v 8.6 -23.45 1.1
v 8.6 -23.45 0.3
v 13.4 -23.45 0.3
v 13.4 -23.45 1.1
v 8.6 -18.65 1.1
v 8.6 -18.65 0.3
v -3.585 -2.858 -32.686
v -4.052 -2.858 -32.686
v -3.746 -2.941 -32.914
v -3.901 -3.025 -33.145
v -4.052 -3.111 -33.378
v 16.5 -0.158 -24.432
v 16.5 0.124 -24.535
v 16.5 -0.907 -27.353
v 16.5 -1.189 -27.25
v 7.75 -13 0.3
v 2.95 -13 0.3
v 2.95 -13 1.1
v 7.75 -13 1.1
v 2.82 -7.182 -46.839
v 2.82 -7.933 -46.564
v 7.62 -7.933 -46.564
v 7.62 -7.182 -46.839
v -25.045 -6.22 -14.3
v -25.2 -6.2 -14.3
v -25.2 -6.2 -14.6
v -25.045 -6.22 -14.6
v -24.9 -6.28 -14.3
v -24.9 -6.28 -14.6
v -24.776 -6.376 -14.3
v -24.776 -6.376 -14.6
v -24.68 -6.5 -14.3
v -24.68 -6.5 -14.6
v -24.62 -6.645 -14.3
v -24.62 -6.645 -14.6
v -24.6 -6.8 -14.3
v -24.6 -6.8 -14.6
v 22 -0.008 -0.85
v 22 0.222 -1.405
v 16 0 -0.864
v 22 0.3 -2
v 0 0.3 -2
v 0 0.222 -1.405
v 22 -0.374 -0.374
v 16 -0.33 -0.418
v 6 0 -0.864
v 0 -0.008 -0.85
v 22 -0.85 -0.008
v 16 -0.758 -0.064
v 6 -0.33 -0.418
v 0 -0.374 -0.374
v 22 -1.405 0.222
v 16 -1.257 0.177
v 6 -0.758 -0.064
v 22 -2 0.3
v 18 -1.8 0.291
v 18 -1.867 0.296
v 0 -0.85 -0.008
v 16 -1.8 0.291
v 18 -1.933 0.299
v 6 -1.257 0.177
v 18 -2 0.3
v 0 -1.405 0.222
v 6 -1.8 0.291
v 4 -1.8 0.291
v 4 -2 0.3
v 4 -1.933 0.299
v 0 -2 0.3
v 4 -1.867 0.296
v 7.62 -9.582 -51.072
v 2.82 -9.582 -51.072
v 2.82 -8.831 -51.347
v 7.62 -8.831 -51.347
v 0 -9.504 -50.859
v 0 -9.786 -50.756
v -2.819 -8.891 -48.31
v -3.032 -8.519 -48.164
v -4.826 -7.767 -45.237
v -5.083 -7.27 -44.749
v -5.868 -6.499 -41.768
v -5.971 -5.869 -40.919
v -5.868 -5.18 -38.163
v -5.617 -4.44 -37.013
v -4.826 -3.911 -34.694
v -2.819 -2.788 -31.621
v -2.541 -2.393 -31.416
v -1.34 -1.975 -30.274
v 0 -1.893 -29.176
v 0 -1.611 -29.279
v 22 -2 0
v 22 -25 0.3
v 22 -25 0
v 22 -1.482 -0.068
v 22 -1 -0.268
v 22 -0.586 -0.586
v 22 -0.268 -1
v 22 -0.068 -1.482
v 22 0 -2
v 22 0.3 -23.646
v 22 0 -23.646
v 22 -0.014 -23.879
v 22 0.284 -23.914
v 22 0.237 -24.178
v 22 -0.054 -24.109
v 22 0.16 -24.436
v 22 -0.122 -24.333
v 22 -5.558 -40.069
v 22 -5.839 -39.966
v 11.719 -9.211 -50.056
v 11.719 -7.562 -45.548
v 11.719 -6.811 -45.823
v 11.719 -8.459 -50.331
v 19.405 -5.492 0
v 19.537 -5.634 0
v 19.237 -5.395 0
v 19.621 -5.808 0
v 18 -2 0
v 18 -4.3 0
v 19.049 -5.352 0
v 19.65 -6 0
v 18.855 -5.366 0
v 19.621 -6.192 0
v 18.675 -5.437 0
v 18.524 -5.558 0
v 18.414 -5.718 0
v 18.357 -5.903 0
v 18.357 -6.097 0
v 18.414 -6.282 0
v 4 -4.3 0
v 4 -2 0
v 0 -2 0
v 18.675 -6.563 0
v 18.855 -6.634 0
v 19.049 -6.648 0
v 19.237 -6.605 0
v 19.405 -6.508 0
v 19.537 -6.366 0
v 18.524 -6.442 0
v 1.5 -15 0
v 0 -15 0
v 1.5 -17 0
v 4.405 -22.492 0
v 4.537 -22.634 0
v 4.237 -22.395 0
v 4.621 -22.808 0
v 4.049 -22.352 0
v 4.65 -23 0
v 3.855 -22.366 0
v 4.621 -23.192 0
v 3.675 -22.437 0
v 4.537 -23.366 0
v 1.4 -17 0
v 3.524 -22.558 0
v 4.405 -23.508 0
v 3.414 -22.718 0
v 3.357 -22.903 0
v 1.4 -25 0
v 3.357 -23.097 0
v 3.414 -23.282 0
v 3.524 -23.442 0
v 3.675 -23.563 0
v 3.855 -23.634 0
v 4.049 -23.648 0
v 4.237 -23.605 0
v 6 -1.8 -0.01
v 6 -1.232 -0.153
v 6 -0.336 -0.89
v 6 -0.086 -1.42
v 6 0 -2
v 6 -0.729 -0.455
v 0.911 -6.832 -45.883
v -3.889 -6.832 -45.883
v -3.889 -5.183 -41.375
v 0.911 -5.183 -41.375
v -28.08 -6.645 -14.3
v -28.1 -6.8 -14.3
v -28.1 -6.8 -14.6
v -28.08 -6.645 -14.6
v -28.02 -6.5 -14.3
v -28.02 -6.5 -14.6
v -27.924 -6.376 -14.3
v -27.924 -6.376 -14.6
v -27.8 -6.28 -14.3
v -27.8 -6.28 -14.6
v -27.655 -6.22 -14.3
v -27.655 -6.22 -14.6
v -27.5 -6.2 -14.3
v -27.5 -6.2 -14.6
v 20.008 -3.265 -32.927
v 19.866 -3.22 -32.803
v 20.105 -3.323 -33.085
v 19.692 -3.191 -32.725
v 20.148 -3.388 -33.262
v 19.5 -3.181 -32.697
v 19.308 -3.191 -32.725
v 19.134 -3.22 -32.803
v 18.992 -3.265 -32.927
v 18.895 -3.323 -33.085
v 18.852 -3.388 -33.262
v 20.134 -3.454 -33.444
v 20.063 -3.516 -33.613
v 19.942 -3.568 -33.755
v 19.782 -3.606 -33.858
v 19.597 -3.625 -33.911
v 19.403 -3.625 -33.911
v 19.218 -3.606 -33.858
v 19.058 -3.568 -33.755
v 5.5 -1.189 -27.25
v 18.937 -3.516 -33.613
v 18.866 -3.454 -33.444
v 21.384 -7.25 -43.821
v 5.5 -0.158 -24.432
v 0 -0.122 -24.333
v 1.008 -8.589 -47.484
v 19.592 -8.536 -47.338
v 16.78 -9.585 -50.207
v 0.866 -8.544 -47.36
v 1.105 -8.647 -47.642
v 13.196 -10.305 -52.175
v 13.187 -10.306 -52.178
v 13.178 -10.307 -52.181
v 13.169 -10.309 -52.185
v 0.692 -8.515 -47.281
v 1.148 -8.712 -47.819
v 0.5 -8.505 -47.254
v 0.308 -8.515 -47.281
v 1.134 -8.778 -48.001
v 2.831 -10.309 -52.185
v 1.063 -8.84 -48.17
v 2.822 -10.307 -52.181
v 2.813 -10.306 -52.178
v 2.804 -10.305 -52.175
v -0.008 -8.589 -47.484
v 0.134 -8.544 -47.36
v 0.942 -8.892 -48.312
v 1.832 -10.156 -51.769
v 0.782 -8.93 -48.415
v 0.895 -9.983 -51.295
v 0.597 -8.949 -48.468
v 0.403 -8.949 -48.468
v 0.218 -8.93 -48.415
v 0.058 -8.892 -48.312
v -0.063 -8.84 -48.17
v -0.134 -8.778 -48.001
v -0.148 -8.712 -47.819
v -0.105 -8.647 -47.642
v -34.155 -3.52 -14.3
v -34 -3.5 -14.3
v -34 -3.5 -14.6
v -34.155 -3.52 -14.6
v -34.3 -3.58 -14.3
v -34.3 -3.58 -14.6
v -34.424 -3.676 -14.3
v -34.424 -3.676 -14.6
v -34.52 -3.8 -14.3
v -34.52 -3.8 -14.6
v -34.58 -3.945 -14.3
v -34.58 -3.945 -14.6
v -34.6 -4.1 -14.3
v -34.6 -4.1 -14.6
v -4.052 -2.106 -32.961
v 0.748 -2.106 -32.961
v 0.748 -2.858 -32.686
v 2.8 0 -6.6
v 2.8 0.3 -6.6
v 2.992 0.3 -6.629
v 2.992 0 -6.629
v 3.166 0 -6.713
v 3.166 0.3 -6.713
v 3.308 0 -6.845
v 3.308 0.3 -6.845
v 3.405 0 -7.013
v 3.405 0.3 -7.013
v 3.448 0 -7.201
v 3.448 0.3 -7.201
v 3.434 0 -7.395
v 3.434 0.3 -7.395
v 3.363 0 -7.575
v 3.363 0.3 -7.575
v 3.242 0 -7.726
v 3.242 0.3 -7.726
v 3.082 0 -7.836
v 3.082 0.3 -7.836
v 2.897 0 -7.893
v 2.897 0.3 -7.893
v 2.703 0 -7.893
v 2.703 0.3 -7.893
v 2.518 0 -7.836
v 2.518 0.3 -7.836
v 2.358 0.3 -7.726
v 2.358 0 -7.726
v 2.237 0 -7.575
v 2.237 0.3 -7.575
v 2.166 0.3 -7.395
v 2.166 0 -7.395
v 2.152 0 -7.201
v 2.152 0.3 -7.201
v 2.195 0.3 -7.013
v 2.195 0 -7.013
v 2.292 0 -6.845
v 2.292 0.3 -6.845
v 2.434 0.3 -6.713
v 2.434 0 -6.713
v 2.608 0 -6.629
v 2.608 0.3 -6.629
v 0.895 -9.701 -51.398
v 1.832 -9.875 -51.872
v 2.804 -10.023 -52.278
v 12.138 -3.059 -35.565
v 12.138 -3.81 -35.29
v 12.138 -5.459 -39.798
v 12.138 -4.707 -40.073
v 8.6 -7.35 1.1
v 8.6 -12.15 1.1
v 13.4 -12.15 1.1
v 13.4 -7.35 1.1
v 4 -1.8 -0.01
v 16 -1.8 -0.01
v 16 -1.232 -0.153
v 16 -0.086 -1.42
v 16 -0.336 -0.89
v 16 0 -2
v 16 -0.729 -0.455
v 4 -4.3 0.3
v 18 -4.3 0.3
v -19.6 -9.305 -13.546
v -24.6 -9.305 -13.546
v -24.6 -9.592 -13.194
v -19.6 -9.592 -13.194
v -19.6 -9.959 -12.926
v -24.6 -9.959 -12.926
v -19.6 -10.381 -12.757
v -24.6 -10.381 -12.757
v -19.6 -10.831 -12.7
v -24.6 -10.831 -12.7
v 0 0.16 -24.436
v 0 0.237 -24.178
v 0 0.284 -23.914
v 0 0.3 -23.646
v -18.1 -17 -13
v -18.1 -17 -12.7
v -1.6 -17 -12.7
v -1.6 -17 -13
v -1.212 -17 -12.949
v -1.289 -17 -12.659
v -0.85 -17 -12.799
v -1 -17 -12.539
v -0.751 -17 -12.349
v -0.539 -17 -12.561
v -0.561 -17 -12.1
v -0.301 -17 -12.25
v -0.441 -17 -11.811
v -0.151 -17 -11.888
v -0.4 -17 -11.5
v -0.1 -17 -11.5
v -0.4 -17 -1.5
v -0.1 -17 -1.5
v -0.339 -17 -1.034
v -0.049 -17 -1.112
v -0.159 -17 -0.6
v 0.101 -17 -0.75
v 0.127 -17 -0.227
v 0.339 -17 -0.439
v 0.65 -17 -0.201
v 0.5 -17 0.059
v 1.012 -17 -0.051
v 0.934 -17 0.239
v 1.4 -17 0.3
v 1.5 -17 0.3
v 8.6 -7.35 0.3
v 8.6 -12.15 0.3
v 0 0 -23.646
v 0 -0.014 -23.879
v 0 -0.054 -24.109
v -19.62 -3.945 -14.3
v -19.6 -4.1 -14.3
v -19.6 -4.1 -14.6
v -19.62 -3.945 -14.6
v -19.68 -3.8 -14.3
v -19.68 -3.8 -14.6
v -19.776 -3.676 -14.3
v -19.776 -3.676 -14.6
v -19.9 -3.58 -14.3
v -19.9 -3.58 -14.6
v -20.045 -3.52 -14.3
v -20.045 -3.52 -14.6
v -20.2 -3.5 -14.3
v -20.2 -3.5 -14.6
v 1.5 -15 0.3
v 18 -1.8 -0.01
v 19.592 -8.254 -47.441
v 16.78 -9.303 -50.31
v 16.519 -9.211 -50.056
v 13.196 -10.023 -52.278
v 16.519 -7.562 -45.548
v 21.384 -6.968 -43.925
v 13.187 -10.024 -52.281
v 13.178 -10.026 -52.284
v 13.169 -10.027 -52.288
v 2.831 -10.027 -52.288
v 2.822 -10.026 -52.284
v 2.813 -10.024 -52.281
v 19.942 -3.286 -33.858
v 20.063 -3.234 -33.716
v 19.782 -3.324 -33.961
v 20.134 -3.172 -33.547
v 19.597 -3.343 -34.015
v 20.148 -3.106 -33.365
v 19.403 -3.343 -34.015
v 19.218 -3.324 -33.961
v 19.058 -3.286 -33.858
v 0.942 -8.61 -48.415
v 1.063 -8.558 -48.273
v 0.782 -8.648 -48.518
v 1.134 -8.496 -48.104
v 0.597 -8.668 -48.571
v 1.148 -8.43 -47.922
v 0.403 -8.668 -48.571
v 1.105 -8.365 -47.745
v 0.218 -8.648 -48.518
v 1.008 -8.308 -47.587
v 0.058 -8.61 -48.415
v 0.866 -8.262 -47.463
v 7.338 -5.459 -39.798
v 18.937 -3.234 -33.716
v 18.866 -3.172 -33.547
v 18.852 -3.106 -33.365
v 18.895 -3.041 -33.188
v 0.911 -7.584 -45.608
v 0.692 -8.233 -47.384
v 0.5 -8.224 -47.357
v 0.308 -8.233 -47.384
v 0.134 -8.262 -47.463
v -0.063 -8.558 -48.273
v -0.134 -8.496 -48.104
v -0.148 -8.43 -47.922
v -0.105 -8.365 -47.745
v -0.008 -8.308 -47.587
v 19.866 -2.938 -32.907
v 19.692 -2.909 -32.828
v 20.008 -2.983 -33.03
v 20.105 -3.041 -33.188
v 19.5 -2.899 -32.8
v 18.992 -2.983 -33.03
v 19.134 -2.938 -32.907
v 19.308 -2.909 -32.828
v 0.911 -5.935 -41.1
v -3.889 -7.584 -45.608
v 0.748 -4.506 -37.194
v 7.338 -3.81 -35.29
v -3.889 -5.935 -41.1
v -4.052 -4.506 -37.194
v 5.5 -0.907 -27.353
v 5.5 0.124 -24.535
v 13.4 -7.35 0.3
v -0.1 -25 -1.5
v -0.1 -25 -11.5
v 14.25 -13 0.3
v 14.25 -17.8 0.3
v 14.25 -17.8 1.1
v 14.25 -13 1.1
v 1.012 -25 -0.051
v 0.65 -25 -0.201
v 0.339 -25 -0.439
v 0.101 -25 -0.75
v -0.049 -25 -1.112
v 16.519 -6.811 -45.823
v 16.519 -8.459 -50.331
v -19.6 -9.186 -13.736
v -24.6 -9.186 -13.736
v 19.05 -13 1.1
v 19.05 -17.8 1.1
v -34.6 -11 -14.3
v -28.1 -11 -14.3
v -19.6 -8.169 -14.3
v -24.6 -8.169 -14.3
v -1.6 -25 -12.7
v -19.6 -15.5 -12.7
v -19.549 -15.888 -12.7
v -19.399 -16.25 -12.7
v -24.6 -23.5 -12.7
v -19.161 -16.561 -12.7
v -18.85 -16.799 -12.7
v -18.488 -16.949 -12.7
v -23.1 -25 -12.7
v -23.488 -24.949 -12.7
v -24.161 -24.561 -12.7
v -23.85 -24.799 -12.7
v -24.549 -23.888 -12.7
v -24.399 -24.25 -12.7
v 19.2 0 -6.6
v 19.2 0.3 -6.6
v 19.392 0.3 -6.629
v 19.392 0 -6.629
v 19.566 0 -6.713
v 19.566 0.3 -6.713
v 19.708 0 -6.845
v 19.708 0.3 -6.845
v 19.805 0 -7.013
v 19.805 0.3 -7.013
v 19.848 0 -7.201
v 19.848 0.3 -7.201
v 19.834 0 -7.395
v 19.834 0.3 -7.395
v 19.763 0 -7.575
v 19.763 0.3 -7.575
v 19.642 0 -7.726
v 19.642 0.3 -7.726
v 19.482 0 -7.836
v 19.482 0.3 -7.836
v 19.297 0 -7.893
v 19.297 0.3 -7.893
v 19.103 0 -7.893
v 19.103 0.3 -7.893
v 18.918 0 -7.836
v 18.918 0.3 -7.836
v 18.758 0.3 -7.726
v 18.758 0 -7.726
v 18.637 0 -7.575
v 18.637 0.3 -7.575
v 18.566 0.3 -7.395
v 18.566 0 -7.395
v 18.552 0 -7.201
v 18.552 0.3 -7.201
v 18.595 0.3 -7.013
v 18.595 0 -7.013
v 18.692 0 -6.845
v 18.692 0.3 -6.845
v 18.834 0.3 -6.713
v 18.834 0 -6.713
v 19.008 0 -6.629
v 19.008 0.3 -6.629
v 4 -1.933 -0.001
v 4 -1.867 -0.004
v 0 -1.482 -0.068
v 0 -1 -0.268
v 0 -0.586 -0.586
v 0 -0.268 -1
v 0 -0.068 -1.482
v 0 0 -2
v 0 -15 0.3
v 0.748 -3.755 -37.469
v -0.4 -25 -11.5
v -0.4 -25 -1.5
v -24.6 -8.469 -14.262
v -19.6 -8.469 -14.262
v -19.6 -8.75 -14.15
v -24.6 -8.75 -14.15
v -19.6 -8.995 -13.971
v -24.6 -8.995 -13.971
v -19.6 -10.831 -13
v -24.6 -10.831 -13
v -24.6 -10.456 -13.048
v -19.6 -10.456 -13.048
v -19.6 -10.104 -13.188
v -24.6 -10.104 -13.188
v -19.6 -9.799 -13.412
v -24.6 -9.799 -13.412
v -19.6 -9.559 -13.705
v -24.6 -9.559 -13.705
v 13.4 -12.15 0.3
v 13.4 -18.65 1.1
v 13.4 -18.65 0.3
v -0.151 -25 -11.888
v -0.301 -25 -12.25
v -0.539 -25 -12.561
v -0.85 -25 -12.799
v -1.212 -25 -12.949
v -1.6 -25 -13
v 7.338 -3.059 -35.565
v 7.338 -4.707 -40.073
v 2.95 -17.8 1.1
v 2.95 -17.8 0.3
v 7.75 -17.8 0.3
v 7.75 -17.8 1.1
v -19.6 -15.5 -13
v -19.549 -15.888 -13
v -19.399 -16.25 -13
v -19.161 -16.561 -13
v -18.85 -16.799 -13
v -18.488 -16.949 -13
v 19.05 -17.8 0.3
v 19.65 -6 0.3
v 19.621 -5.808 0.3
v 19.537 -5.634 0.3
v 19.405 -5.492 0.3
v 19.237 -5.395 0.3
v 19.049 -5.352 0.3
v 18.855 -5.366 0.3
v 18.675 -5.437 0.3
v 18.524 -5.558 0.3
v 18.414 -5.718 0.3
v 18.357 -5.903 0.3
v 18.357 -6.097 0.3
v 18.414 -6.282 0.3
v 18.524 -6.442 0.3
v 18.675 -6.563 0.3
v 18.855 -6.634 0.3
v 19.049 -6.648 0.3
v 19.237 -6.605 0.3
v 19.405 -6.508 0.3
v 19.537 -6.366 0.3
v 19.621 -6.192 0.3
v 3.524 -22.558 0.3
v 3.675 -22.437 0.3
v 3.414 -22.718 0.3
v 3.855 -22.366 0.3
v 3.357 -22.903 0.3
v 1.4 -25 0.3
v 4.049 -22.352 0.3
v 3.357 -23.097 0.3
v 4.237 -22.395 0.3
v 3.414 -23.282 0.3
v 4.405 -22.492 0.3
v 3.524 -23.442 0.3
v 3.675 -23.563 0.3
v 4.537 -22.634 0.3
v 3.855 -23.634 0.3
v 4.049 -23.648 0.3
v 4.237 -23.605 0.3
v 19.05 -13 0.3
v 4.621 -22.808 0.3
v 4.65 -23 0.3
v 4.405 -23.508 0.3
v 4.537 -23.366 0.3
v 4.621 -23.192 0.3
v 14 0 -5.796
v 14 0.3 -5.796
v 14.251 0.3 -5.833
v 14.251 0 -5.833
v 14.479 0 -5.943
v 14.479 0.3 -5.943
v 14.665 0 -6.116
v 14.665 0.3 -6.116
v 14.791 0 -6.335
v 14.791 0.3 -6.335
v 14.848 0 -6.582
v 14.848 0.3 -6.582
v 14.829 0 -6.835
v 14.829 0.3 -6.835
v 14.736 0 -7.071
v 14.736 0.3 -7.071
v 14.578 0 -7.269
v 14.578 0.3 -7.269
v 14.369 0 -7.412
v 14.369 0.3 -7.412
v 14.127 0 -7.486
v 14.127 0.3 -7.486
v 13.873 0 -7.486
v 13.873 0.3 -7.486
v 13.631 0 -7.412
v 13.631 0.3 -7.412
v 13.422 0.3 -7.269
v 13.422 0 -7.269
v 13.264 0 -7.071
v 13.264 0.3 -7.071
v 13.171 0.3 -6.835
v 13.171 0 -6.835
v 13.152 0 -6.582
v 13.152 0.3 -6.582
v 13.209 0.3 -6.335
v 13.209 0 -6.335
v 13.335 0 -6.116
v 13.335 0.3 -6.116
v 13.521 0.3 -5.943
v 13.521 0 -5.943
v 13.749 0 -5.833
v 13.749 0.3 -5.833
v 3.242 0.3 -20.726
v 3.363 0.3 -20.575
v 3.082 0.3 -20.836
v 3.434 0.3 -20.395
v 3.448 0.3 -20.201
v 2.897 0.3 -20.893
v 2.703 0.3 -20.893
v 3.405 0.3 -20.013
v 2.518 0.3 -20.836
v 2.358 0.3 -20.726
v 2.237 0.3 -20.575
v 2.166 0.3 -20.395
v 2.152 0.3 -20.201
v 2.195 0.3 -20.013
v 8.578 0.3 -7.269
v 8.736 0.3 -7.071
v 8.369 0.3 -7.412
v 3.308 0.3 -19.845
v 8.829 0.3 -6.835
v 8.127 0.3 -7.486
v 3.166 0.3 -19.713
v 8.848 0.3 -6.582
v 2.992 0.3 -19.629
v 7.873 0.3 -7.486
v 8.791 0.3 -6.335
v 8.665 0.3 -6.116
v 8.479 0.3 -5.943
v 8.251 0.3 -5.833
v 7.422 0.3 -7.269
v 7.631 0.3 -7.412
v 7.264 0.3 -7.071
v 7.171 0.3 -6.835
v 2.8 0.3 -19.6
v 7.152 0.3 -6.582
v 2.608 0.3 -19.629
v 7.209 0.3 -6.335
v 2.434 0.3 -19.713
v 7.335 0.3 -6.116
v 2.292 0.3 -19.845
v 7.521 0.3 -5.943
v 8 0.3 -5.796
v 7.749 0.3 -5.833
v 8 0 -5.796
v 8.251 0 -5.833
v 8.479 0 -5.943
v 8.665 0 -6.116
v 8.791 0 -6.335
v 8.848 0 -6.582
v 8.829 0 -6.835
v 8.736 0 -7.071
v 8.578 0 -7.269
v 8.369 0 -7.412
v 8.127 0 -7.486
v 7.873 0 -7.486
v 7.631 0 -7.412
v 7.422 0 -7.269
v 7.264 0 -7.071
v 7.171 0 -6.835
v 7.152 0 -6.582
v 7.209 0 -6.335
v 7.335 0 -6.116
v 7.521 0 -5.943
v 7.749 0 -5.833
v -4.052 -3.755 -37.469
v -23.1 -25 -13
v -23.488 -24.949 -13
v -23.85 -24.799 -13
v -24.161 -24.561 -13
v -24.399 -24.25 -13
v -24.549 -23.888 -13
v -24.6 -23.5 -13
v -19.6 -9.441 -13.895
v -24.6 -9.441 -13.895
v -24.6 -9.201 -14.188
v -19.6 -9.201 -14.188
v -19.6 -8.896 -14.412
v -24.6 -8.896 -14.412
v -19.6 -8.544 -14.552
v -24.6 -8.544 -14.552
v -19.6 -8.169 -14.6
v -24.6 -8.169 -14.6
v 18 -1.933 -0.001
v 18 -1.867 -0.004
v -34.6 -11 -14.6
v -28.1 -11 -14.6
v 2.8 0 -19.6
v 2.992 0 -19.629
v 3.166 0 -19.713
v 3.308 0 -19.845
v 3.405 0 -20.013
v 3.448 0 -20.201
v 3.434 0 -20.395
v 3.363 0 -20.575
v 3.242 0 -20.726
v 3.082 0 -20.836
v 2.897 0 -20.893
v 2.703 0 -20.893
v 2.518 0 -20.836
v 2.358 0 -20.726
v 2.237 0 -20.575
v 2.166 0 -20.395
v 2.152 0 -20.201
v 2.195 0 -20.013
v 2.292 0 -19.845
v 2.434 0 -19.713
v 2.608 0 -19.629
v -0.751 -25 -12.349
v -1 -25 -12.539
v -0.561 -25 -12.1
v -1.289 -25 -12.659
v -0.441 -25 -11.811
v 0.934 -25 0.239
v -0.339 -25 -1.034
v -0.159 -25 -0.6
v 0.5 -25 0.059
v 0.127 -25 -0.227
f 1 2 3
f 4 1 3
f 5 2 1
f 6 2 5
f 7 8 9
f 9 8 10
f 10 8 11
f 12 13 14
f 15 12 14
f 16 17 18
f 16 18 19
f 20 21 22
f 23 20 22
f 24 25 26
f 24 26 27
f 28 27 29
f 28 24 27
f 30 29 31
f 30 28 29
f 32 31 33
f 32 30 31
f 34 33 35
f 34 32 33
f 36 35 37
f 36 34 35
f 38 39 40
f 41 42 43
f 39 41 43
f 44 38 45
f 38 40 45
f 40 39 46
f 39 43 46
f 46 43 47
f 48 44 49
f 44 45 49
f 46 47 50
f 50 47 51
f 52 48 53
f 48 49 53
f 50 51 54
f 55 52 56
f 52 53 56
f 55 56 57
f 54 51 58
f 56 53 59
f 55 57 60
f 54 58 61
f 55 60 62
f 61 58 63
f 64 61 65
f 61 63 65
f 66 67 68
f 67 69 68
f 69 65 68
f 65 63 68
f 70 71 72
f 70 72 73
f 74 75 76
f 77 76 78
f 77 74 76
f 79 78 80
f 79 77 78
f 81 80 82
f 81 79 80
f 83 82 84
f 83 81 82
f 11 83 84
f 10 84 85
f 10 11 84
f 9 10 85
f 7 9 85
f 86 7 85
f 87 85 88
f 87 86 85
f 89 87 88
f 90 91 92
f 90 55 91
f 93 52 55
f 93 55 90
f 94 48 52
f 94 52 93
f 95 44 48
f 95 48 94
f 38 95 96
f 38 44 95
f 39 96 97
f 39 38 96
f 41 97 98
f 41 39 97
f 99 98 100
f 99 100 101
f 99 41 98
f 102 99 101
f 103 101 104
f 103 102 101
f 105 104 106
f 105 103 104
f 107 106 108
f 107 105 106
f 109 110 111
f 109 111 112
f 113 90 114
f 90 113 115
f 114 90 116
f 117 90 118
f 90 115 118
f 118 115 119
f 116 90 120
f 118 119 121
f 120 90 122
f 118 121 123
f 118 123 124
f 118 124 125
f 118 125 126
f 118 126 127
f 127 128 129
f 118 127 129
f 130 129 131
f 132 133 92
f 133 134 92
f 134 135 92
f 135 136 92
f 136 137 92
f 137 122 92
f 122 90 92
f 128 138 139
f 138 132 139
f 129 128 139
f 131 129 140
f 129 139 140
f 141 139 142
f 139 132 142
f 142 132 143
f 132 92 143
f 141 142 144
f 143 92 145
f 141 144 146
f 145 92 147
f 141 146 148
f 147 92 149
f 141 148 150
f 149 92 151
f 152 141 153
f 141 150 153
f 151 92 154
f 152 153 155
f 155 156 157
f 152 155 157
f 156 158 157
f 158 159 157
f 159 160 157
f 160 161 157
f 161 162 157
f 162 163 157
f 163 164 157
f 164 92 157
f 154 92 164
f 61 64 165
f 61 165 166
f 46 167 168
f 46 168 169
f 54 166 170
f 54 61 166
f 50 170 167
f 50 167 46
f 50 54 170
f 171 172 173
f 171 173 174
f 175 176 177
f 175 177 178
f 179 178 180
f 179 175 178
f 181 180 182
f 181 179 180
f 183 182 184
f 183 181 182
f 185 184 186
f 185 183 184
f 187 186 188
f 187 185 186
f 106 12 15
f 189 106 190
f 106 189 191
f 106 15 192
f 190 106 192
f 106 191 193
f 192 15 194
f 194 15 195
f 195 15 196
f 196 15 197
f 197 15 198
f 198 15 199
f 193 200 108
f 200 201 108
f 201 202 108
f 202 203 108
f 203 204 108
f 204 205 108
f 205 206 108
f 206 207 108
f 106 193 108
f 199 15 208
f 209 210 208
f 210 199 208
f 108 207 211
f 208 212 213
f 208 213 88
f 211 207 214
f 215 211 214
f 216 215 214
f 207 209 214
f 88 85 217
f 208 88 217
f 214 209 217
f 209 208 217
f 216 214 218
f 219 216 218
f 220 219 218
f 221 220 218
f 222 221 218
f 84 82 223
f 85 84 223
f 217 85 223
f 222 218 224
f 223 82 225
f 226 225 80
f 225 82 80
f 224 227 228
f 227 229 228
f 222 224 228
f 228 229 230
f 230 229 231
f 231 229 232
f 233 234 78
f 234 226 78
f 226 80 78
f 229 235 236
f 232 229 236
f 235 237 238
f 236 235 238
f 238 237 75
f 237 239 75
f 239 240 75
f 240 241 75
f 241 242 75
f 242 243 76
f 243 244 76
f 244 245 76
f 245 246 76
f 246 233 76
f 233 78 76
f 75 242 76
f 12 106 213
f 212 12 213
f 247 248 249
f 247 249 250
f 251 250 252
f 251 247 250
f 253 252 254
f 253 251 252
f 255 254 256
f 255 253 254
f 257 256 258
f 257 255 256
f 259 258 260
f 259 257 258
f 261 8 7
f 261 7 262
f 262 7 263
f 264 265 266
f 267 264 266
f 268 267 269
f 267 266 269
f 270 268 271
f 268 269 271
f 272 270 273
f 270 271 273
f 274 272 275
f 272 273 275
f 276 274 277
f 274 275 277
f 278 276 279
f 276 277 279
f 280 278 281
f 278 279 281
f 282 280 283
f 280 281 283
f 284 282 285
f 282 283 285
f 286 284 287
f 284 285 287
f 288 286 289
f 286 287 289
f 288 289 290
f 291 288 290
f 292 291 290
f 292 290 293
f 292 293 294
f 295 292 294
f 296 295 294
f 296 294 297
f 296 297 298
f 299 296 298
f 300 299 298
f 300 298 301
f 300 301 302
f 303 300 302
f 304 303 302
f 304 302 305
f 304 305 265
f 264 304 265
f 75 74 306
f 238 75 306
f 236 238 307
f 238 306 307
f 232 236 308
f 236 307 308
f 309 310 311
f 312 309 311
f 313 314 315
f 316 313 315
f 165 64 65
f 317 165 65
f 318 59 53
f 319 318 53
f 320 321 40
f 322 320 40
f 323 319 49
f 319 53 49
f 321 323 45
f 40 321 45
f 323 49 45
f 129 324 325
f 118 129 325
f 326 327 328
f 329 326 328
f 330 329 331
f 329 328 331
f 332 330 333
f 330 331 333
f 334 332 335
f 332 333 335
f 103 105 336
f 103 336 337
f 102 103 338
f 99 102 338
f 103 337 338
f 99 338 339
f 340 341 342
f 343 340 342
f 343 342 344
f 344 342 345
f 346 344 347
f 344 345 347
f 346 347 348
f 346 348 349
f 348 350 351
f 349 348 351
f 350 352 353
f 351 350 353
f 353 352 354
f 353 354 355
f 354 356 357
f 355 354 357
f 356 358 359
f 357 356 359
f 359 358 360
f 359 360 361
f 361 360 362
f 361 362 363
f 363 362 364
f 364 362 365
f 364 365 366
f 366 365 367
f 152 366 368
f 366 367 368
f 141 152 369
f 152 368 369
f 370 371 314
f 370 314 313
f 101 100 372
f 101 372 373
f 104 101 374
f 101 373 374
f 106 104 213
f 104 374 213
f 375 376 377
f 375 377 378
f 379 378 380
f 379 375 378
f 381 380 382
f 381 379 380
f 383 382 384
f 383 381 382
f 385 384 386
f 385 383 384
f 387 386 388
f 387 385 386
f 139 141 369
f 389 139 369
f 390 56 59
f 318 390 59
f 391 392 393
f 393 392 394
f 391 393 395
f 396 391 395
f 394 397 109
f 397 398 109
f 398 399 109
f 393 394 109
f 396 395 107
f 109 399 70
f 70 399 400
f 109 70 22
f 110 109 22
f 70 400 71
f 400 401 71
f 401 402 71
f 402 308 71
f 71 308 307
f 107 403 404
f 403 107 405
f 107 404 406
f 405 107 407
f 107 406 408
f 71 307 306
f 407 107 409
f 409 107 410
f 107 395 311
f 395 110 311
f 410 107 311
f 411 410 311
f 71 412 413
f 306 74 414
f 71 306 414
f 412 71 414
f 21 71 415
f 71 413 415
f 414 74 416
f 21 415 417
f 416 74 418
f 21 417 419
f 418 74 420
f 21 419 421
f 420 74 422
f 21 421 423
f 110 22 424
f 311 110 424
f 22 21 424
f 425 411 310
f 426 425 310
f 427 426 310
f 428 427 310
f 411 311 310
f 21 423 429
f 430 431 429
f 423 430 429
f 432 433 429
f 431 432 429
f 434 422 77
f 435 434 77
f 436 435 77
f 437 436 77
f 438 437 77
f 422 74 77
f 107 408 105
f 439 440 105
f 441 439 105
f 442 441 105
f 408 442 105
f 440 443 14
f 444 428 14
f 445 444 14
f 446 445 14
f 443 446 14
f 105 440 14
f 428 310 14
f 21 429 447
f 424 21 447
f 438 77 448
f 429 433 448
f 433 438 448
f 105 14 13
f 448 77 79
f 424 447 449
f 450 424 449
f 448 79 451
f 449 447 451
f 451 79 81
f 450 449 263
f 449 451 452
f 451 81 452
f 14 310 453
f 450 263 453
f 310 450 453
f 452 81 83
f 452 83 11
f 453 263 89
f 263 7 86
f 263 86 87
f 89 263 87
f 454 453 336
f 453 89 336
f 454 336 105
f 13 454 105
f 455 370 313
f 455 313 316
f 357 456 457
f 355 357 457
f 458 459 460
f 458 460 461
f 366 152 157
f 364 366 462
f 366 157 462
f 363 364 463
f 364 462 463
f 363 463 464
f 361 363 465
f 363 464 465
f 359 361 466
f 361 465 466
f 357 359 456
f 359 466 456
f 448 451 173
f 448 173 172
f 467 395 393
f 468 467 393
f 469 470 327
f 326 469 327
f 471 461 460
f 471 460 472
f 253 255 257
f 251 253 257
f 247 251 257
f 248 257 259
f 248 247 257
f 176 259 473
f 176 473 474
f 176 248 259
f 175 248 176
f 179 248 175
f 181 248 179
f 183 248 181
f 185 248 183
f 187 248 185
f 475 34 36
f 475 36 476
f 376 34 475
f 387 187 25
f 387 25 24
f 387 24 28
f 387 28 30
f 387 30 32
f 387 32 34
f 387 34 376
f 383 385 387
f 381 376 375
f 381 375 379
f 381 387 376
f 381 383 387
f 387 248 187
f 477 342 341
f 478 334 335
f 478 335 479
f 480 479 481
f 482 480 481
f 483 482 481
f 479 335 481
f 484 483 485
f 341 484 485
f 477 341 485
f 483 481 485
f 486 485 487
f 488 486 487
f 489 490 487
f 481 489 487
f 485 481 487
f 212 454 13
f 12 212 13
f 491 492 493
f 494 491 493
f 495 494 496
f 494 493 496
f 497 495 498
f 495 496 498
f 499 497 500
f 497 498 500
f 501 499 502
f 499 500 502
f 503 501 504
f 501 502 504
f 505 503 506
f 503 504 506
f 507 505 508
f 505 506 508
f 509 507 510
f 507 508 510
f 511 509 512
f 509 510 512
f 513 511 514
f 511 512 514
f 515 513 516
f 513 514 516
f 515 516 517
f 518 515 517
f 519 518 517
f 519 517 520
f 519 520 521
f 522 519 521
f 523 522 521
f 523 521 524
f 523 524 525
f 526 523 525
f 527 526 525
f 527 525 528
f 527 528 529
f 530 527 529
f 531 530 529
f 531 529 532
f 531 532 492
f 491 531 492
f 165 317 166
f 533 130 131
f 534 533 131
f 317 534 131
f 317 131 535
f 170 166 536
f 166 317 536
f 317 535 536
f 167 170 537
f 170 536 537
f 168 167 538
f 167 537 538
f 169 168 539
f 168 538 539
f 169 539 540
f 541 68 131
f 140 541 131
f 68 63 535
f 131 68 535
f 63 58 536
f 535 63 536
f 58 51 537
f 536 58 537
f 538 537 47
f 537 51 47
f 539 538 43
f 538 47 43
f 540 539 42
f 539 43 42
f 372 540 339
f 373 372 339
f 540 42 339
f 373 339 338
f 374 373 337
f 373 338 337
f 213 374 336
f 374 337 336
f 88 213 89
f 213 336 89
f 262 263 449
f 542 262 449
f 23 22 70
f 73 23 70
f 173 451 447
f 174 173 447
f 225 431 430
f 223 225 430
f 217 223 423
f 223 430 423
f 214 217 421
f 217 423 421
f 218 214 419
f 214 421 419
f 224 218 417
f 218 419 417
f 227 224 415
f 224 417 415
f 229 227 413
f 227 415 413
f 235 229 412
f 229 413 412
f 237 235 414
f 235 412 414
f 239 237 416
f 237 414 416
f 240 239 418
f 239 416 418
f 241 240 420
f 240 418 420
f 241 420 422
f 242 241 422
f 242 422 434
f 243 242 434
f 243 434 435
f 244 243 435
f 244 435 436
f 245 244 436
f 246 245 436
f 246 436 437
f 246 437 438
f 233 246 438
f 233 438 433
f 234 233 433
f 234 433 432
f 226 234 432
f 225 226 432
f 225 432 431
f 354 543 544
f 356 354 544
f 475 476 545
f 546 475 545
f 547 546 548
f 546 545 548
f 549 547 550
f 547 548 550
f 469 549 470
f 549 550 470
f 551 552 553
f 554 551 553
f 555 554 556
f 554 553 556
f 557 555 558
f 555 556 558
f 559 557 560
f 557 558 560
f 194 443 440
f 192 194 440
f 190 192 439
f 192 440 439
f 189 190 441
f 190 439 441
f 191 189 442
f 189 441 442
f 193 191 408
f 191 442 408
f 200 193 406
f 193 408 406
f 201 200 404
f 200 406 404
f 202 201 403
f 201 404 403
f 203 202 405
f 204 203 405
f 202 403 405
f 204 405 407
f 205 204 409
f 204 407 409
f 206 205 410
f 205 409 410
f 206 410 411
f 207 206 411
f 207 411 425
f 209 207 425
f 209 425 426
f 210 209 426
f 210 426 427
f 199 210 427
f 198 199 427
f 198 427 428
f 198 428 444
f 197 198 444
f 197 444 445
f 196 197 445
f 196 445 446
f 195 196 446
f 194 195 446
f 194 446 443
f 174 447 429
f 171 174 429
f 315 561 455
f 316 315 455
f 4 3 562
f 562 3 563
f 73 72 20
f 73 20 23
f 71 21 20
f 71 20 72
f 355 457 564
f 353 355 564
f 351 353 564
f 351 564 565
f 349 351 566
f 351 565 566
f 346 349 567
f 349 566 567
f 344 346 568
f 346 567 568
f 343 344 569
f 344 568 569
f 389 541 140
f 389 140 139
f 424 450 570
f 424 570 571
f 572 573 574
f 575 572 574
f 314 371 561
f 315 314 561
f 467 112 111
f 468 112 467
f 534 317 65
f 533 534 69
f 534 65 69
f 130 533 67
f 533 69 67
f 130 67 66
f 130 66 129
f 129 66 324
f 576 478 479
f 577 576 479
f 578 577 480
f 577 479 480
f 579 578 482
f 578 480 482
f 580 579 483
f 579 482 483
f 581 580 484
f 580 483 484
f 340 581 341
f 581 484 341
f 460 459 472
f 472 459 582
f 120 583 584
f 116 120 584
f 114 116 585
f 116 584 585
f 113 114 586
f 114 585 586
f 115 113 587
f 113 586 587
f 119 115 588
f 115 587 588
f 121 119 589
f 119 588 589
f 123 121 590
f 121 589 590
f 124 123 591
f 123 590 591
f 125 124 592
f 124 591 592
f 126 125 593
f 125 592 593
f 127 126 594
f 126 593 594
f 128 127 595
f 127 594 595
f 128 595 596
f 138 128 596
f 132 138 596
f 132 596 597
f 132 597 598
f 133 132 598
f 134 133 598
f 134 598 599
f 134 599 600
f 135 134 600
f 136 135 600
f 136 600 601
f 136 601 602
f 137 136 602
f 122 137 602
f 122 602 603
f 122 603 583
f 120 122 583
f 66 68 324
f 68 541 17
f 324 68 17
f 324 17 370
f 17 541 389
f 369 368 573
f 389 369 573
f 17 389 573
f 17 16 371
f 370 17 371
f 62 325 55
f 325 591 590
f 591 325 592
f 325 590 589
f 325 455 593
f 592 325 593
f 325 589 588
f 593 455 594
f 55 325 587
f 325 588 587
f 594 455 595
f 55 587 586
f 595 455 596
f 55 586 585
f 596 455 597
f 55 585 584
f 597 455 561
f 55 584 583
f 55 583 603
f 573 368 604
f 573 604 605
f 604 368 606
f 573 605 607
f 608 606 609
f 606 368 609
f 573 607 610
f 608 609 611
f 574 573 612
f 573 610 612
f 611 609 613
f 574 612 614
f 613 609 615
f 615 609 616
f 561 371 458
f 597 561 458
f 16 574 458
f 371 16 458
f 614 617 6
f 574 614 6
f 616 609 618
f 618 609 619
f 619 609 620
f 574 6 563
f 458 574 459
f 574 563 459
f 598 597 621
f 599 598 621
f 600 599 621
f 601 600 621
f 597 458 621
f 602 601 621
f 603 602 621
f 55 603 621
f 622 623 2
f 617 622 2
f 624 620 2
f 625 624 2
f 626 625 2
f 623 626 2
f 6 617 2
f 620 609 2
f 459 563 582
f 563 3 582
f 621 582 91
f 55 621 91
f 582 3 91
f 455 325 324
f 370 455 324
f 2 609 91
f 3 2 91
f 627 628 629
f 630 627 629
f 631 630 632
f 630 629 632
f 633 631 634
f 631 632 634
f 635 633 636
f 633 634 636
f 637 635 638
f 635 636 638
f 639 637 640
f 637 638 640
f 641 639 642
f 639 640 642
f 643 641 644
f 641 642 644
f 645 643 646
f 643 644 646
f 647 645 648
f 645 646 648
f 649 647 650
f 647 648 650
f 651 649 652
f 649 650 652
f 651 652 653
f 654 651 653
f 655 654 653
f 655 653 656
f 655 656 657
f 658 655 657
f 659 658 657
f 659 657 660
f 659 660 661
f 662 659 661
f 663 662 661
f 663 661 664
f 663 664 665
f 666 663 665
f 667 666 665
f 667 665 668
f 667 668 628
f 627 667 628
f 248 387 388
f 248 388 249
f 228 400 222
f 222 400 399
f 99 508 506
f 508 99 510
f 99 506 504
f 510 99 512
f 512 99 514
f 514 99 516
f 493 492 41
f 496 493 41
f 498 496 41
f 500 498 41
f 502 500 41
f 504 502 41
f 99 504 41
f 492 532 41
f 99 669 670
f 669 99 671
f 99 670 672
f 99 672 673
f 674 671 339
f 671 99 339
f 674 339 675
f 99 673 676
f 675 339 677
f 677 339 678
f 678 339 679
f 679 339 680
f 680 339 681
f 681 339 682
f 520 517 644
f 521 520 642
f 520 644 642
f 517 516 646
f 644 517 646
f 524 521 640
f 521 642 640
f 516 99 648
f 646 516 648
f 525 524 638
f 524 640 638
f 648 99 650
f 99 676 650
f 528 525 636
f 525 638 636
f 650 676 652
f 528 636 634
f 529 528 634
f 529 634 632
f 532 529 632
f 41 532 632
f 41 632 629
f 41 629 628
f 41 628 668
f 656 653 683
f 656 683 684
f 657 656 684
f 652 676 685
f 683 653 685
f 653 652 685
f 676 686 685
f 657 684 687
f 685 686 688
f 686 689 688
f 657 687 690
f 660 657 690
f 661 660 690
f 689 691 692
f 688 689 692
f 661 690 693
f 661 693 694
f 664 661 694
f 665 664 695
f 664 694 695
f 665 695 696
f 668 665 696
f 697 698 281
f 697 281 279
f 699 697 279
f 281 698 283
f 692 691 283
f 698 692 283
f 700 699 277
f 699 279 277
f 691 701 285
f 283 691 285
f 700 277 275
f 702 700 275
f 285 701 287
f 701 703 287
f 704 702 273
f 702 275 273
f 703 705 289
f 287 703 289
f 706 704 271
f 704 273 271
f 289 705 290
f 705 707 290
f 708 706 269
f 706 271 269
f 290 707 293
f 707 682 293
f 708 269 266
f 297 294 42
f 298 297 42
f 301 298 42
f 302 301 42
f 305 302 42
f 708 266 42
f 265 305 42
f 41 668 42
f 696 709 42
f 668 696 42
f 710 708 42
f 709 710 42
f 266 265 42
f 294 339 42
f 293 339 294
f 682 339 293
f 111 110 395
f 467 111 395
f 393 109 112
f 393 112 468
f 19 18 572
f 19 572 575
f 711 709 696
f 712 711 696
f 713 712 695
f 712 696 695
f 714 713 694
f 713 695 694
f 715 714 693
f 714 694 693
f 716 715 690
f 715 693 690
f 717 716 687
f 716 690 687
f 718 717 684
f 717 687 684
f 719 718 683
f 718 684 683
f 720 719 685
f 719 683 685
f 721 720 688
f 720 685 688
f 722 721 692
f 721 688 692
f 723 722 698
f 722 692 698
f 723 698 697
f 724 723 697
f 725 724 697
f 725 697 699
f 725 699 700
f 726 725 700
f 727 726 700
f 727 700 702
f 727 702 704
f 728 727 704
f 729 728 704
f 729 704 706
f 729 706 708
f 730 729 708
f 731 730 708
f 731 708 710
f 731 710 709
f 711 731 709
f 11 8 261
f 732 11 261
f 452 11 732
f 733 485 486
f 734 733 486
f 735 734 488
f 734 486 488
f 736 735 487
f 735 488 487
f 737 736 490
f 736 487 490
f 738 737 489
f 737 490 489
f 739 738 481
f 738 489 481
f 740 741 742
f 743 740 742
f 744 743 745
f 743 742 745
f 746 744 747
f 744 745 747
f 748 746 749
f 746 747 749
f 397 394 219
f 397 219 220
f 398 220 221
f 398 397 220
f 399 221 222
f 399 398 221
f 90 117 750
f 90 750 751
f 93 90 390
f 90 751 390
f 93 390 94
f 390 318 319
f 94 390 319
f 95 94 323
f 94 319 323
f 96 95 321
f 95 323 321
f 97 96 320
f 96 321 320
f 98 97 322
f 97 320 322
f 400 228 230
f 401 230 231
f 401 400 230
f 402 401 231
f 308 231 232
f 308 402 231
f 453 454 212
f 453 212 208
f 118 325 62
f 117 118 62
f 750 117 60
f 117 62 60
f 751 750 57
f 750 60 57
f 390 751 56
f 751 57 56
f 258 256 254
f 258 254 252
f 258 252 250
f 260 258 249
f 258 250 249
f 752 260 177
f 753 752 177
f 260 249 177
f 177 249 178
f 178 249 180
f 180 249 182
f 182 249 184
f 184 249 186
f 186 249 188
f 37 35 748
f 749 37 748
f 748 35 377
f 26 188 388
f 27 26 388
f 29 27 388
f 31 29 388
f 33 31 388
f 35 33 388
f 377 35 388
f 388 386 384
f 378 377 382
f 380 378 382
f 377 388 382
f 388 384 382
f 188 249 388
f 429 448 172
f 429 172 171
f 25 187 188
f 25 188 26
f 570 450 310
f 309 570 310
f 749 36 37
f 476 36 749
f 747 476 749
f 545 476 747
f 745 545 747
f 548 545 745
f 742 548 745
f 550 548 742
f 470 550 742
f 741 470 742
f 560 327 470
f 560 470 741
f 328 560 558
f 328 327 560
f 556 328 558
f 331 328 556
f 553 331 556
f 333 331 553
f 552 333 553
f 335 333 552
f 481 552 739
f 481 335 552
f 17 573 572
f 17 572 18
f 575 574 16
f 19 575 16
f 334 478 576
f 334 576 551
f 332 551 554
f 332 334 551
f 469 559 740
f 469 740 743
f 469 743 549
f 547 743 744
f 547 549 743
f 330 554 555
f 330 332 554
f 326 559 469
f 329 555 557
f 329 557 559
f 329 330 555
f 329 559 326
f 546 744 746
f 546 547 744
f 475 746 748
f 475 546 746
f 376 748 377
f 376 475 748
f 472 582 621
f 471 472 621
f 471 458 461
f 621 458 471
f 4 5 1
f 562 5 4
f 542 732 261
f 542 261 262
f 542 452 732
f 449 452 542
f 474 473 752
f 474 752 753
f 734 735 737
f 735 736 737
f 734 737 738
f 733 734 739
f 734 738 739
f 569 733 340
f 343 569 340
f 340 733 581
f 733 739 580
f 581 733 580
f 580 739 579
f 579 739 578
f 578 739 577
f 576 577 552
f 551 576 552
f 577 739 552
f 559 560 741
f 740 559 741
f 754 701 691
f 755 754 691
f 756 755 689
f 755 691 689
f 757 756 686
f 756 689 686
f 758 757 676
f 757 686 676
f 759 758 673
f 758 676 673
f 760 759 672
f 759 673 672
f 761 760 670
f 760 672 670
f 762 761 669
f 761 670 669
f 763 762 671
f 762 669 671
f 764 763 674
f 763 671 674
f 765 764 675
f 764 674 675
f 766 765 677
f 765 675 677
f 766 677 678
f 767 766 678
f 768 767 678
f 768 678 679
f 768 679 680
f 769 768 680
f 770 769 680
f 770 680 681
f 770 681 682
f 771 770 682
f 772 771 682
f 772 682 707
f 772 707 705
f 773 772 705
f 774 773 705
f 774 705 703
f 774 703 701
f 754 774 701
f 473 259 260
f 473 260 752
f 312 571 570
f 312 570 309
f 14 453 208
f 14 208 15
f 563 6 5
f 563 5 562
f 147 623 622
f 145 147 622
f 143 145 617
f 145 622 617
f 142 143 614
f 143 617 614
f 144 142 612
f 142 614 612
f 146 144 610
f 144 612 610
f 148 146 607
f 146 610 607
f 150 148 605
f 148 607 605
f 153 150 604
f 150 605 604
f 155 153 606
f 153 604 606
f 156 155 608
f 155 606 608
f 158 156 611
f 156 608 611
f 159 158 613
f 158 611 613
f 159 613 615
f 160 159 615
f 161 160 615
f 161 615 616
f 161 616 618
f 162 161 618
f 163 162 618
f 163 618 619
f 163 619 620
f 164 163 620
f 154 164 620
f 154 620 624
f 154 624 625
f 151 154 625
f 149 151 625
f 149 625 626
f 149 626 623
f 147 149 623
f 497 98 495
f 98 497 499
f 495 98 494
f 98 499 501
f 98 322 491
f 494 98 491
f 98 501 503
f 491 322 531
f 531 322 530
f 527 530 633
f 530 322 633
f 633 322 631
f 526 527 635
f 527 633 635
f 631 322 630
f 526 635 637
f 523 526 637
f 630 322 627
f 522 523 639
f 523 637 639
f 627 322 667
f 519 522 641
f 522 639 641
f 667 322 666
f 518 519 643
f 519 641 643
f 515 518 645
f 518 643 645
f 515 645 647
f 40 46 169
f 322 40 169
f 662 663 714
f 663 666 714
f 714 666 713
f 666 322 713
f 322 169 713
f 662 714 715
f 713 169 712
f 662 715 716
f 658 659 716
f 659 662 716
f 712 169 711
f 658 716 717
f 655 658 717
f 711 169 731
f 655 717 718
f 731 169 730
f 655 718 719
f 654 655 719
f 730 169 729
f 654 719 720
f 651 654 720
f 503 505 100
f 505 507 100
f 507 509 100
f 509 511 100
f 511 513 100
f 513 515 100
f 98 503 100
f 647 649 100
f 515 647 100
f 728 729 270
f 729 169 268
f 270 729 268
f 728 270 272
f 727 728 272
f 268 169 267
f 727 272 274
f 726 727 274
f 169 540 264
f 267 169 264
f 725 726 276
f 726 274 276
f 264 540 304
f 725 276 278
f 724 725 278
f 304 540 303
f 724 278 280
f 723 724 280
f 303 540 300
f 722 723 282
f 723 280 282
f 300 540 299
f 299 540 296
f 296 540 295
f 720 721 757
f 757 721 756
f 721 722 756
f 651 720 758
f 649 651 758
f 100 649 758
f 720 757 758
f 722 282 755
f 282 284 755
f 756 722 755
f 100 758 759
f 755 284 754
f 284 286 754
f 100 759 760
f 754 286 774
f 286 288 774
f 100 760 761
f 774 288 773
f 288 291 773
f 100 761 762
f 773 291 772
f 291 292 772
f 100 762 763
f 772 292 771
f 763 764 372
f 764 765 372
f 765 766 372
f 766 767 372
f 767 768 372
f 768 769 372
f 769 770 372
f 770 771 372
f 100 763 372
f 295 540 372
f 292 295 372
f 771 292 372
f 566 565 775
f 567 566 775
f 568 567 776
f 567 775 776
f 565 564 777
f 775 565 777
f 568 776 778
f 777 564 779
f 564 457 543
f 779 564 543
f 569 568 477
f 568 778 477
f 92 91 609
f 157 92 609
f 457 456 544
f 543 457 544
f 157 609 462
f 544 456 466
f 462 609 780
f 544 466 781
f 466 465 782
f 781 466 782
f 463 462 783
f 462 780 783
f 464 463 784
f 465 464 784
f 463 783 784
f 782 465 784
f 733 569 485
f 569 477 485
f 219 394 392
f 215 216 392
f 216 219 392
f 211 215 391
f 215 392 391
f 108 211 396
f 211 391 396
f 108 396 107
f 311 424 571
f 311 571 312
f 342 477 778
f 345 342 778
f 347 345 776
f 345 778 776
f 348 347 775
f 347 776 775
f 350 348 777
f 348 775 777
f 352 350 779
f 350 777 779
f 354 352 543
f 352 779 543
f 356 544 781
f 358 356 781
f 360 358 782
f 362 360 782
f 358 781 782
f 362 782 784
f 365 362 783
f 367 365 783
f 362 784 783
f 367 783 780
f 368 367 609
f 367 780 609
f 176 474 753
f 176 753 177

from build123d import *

# Parameters (mm, degrees)
EXTRUDE_1_DEPTH     = 22
CUT_EXTRUDE_1_DEPTH = 4
CUT_EXTRUDE_2_DEPTH = 64.319089808
SKETCH_3_3_R        = 14
EXTRUDE_2_DEPTH     = 0.3
SKETCH_4_W          = 4.8
SKETCH_4_H          = 4.8
EXTRUDE_3_DEPTH     = 0.8
SKETCH_5_R          = 0.85
CUT_EXTRUDE_3_DEPTH = 63.897702188
SKETCH_6_W          = 11
SKETCH_6_H          = 3
CUT_EXTRUDE_4_DEPTH = 1
SKETCH_7_W          = 4.8
SKETCH_7_H          = 4.8
EXTRUDE_4_DEPTH     = 0.8
SKETCH_9_W          = 1.5
SKETCH_9_H          = 0.3
CUT_EXTRUDE_5_DEPTH = 10
EXTRUDE_5_DEPTH     = 8
EXTRUDE_6_DEPTH     = 0.3
EXTRUDE_7_DEPTH     = 5
EXTRUDE_8_DEPTH     = 0.3
SKETCH_14_R         = 0.65
SKETCH_14_W         = 12
SKETCH_14_H         = 2
CUT_EXTRUDE_6_DEPTH = 4
SKETCH_15_R         = 0.65
CUT_EXTRUDE_7_DEPTH = 4
SKETCH_16_R         = 0.65
CUT_EXTRUDE_8_DEPTH = 4


with BuildPart() as part:
    # 草图1 → 凸台-拉伸1 (new body)
    with BuildSketch(Plane(origin=(0, 0, 0), x_dir=(0, 0, -1), z_dir=(1, 0, 0))):
        with BuildLine():
            Line((0, -25), (0, -2))
            ThreePointArc((0, -2), (0.585786438, -0.585786438), (2, 0))
            Line((2, 0), (23.64572618, 0))
            ThreePointArc((23.64572618, 0), (23.99456936, -0.030657867), (24.332717753, -0.121691565))
            Line((24.332717753, -0.121691565), (52.174626532, -10.304873595))
            Line((52.174626532, -10.304873595), (52.277675268, -10.023127329))
            Line((52.277675268, -10.023127329), (24.435766489, 0.160054701))
            ThreePointArc((24.435766489, 0.160054701), (24.046895837, 0.264743453), (23.64572618, 0.3))
            Line((23.64572618, 0.3), (2, 0.3))
            ThreePointArc((2, 0.3), (0.373654403, -0.373654403), (-0.3, -2))
            Line((-0.3, -2), (-0.3, -25))
            Line((-0.3, -25), (0, -25))
        make_face()
    extrude(amount=EXTRUDE_1_DEPTH)

    # 草图2 → 切除-拉伸1 (cut)
    with BuildSketch(Plane.XY.offset(0.3)):
        Polygon((4, -4.3), (18, -4.3), (18, -1.8), (16, -1.8), (16, 0), (6, 0), (6, -1.8), (4, -1.8), align=None)
    extrude(amount=-CUT_EXTRUDE_1_DEPTH, mode=Mode.SUBTRACT)

    # 草图3 → 切除-拉伸2 (cut, through all)
    with BuildSketch(Plane(origin=(0, 8.024038665, -2.934793264), x_dir=(1, 0, 0), z_dir=(0, 0.9391542177229502, -0.3434957864853564))):
        with BuildLine():
            ThreePointArc((13.196152423, 52.539701225), (19.591939741, 47.38998358), (22, 39.539701225))
            Line((22, 39.539701225), (22, 52.539701225))
            Line((22, 52.539701225), (13.196152423, 52.539701225))
        make_face()
        with BuildLine():
            ThreePointArc((0, 51.028826518), (1.358818231, 51.864258204), (2.803847577, 52.539701225))
            Line((2.803847577, 52.539701225), (0, 52.539701225))
            Line((0, 52.539701225), (0, 51.028826518))
        make_face()
    extrude(amount=-CUT_EXTRUDE_2_DEPTH, mode=Mode.SUBTRACT)

    # 草图3<3> → 凸台-拉伸2 (add)
    with BuildSketch(Plane(origin=(0, 8.024038665, -2.934793264), x_dir=(1, 0, 0), z_dir=(0, 0.9391542177229502, -0.3434957864853564))):
        with Locations((8, 39.539701225)):
            Circle(SKETCH_3_3_R)
    extrude(amount=-EXTRUDE_2_DEPTH)

    # 草图4 → 凸台-拉伸3 (add)
    with BuildSketch(Plane.XY.offset(0.3)):
        with Locations((11, -9.75)):
            Rectangle(SKETCH_4_W, SKETCH_4_H)
        with Locations((11, -21.05)):
            Rectangle(SKETCH_4_W, SKETCH_4_H)
        with Locations((5.35, -15.4)):
            Rectangle(SKETCH_4_W, SKETCH_4_H)
        with Locations((16.65, -15.4)):
            Rectangle(SKETCH_4_W, SKETCH_4_H)
    extrude(amount=EXTRUDE_3_DEPTH)

    # 草图5 → 切除-拉伸3 (cut, through all)
    with BuildSketch(Plane(origin=(0, 0.3, 0), x_dir=(1, 0, 0), z_dir=(0, 1, 0))):
        with Locations((8, 6.64572618)):
            Circle(SKETCH_5_R)
        with Locations((14, 6.64572618)):
            Circle(SKETCH_5_R)
    extrude(amount=-CUT_EXTRUDE_3_DEPTH, mode=Mode.SUBTRACT)

    # 草图6 → 切除-拉伸4 (cut)
    with BuildSketch(Plane(origin=(0, 8.024038665, -2.934793264), x_dir=(1, 0, 0), z_dir=(0, 0.9391542177229502, -0.3434957864853564))):
        with Locations((11, 24.5)):
            Rectangle(SKETCH_6_W, SKETCH_6_H)
    extrude(amount=-CUT_EXTRUDE_4_DEPTH, mode=Mode.SUBTRACT)

    # 草图7 → 凸台-拉伸4 (add)
    with BuildSketch(Plane(origin=(0, 8.024038665, -2.934793264), x_dir=(1, 0, 0), z_dir=(0, 0.9391542177229502, -0.3434957864853564))):
        with Locations((9.738477049, 36.851443585)):
            Rectangle(SKETCH_7_W, SKETCH_7_H)
        with Locations((14.118767038, 47.774445204)):
            Rectangle(SKETCH_7_W, SKETCH_7_H)
        with Locations((5.219570287, 48.855656024)):
            Rectangle(SKETCH_7_W, SKETCH_7_H)
        with Locations((-1.489481468, 43.037611303)):
            Rectangle(SKETCH_7_W, SKETCH_7_H)
        with Locations((-1.651961899, 34.079108149)):
            Rectangle(SKETCH_7_W, SKETCH_7_H)
    extrude(amount=EXTRUDE_4_DEPTH)

    # 草图9 → 切除-拉伸5 (cut)
    with BuildSketch(Plane.XZ.offset(25)):
        with Locations((0.75, 0.15)):
            Rectangle(SKETCH_9_W, SKETCH_9_H)
    extrude(amount=-CUT_EXTRUDE_5_DEPTH, mode=Mode.SUBTRACT)

    # 草图10 → 凸台-拉伸5 (add)
    with BuildSketch(Plane.XZ.offset(25)):
        with BuildLine():
            Line((1.5, 0), (1.4, 0))
            ThreePointArc((1.4, 0), (0.339339828, -0.439339828), (-0.1, -1.5))
            Line((-0.1, -1.5), (-0.1, -11.5))
            ThreePointArc((-0.1, -11.5), (-0.539339828, -12.560660172), (-1.6, -13))
            Line((-1.6, -13), (-17.6, -13))
            Line((-17.6, -13), (-17.6, -12.7))
            Line((-17.6, -12.7), (-1.6, -12.7))
            ThreePointArc((-1.6, -12.7), (-0.751471863, -12.348528137), (-0.4, -11.5))
            Line((-0.4, -11.5), (-0.4, -1.5))
            ThreePointArc((-0.4, -1.5), (0.127207794, -0.227207794), (1.4, 0.3))
            Line((1.4, 0.3), (1.5, 0.3))
            Line((1.5, 0.3), (1.5, 0))
        make_face()
    extrude(amount=-EXTRUDE_5_DEPTH)

    # 草图11 → 凸台-拉伸6 (add)
    with BuildSketch(Plane.XY.offset(-12.7)):
        with BuildLine():
            Line((-17.6, -17), (-17.6, -25))
            Line((-17.6, -25), (-23.1, -25))
            ThreePointArc((-23.1, -25), (-24.160660172, -24.560660172), (-24.6, -23.5))
            Line((-24.6, -23.5), (-24.6, -11))
            Line((-24.6, -11), (-19.6, -11))
            Line((-19.6, -11), (-19.6, -15.5))
            ThreePointArc((-19.6, -15.5), (-19.160660172, -16.560660172), (-18.1, -17))
            Line((-18.1, -17), (-17.6, -17))
        make_face()
    extrude(amount=-EXTRUDE_6_DEPTH)

    # 草图12 → 凸台-拉伸7 (add)
    with BuildSketch(Plane.ZY.offset(24.6)):
        with BuildLine():
            Line((-13, -11), (-13, -10.831371462))
            ThreePointArc((-13, -10.831371462), (-13.188036278, -10.104218664), (-13.70500159, -9.559374006))
            Line((-13.70500159, -9.559374006), (-13.89499841, -9.440625994))
            ThreePointArc((-13.89499841, -9.440625994), (-14.411963722, -8.895781336), (-14.6, -8.168628538))
            Line((-14.6, -8.168628538), (-14.6, -8))
            Line((-14.6, -8), (-14.3, -8))
            Line((-14.3, -8), (-14.3, -8.168628538))
            ThreePointArc((-14.3, -8.168628538), (-14.149570977, -8.750350777), (-13.735998728, -9.186226503))
            Line((-13.735998728, -9.186226503), (-13.546001908, -9.304974515))
            ThreePointArc((-13.546001908, -9.304974515), (-12.925643534, -9.958788104), (-12.7, -10.831371462))
            Line((-12.7, -10.831371462), (-12.7, -11))
            Line((-12.7, -11), (-13, -11))
        make_face()
    extrude(amount=-EXTRUDE_7_DEPTH)

    # 草图13 → 凸台-拉伸8 (add)
    with BuildSketch(Plane.XY.offset(-14.3)):
        with BuildLine():
            Line((-24.6, -8), (-19.6, -8))
            Line((-19.6, -8), (-19.6, -4.1))
            ThreePointArc((-19.6, -4.1), (-19.775735931, -3.675735931), (-20.2, -3.5))
            Line((-20.2, -3.5), (-34, -3.5))
            ThreePointArc((-34, -3.5), (-34.424264069, -3.675735931), (-34.6, -4.1))
            Line((-34.6, -4.1), (-34.6, -11))
            Line((-34.6, -11), (-28.1, -11))
            Line((-28.1, -11), (-28.1, -6.8))
            ThreePointArc((-28.1, -6.8), (-27.924264069, -6.375735931), (-27.5, -6.2))
            Line((-27.5, -6.2), (-25.2, -6.2))
            ThreePointArc((-25.2, -6.2), (-24.775735931, -6.375735931), (-24.6, -6.8))
            Line((-24.6, -6.8), (-24.6, -8))
        make_face()
    extrude(amount=-EXTRUDE_8_DEPTH)

    # 草图14 → 切除-拉伸6 (cut)
    with BuildSketch(Plane(origin=(0, 8.024038665, -2.934793264), x_dir=(1, 0, 0), z_dir=(0, 0.9391542177229502, -0.3434957864853564))):
        with Locations((0.5, 47.950575932)):
            Circle(SKETCH_14_R)
        with Locations((19.5, 32.450575932)):
            Circle(SKETCH_14_R)
        with Locations((8, 53.550575932)):
            Rectangle(SKETCH_14_W, SKETCH_14_H)
    extrude(amount=-CUT_EXTRUDE_6_DEPTH, mode=Mode.SUBTRACT)

    # 草图15 → 切除-拉伸7 (cut)
    with BuildSketch(Plane(origin=(0, 0.3, 0), x_dir=(1, 0, 0), z_dir=(0, 1, 0))):
        with Locations((2.8, 20.25)):
            Circle(SKETCH_15_R)
        with Locations((2.8, 7.25)):
            Circle(SKETCH_15_R)
        with Locations((19.2, 7.25)):
            Circle(SKETCH_15_R)
    extrude(amount=-CUT_EXTRUDE_7_DEPTH, mode=Mode.SUBTRACT)

    # 草图16 → 切除-拉伸8 (cut)
    with BuildSketch(Plane.XY.offset(0.3)):
        with Locations((19, -6)):
            Circle(SKETCH_16_R)
        with Locations((4, -23)):
            Circle(SKETCH_16_R)
    extrude(amount=-CUT_EXTRUDE_8_DEPTH, mode=Mode.SUBTRACT)


solid = part.part
